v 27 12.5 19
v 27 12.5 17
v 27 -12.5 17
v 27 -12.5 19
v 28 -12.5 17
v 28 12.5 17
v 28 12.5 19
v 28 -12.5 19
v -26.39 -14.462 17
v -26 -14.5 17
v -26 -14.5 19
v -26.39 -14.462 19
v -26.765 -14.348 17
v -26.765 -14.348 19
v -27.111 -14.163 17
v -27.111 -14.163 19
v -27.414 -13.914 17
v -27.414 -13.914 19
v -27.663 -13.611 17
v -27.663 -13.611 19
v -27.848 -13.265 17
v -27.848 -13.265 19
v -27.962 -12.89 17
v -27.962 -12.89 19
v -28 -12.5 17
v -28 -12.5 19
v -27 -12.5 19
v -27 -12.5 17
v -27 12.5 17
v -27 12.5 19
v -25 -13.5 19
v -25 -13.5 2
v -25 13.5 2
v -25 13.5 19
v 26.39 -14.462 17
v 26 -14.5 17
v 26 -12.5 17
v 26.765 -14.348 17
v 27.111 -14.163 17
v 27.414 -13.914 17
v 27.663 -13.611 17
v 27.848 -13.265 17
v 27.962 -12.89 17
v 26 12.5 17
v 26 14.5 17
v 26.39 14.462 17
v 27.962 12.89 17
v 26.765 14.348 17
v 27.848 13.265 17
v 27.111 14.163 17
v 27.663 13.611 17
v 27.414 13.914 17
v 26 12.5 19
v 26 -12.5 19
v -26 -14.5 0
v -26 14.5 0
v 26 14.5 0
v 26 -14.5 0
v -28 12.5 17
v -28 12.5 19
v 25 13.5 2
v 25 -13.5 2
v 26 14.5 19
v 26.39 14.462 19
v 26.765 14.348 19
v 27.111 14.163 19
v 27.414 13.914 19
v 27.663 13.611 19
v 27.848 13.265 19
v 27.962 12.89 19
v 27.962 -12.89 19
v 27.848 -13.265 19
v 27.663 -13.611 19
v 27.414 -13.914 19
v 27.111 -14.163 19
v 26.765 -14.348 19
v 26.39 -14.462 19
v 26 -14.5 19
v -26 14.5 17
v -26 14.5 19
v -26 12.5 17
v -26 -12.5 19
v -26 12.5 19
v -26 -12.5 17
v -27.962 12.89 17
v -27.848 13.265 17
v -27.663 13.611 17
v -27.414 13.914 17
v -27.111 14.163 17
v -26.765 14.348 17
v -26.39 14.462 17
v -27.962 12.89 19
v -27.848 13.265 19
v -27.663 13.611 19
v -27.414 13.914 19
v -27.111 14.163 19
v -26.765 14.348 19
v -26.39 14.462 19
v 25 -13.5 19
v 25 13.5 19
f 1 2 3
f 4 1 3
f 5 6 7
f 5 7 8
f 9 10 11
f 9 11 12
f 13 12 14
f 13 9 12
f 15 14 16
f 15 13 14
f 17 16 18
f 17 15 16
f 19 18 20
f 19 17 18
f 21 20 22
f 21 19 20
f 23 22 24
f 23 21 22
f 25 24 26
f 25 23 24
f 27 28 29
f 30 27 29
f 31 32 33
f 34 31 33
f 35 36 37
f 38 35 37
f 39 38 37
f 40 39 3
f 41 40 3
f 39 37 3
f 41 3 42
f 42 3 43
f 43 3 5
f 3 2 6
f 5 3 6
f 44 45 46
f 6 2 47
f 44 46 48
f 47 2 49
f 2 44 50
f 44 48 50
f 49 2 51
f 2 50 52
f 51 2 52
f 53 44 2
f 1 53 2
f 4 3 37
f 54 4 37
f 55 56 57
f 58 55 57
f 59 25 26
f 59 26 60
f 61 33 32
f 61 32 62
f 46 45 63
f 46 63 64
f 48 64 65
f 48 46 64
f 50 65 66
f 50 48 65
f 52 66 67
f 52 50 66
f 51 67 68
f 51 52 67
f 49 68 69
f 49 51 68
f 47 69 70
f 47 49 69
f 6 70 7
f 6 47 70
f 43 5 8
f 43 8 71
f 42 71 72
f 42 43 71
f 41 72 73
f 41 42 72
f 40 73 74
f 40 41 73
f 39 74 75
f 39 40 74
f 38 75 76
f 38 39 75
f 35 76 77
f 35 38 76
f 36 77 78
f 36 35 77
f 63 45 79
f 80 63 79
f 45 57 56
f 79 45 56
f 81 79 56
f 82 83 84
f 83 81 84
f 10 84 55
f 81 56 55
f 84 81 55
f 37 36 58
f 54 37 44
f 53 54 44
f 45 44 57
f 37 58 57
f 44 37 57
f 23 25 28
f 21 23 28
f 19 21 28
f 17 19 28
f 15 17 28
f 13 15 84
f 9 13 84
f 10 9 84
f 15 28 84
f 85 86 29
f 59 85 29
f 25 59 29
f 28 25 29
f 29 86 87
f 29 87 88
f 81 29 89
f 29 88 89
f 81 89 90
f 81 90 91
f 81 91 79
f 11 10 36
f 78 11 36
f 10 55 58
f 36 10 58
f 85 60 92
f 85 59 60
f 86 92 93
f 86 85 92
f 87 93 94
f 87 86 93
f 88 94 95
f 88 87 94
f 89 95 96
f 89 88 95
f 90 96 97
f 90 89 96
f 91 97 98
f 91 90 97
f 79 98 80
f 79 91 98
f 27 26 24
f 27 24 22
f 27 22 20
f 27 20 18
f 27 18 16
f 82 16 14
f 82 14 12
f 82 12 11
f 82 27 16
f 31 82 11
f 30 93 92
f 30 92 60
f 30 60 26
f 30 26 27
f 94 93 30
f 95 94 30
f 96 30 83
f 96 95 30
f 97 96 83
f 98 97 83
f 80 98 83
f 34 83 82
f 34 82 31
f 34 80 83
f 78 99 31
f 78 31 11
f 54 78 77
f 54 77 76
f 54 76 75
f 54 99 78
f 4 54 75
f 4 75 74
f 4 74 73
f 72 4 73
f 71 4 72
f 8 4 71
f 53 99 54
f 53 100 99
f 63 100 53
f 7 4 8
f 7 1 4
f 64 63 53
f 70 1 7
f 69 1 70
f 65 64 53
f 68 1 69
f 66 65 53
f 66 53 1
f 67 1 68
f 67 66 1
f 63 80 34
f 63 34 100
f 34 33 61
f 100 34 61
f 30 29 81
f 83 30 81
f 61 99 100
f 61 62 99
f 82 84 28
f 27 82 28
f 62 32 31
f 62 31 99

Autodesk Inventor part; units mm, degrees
ref_plane "YZ Plane" through (0, 0, 0) normal (1, 0, 0) x (0, 1, 0)
ref_plane "XZ Plane" through (0, 0, 0) normal (0, 1, 0) x (-1, 0, 0)
ref_plane "XY Plane" through (0, 0, 0) normal (0, 0, 1) x (1, 0, 0)
sketch "Эскиз1" plane through (0, 0, 0) normal (0, 0, 1) x (1, 0, 0)
  line L0 (-26, 14.5) -> (26, 14.5)
  line L1 (26, 14.5) -> (26, -14.5)
  line L2 (26, -14.5) -> (-26, -14.5)
  line L3 (-26, -14.5) -> (-26, 14.5)
  line L4 (0, -20.3) -> (0, 20.3) projected
  line L5 (-36.4, 0) -> (36.4, 0) projected
  point P0 (0, 0)
  dimension "d0" = 29
  dimension "d1" = 52
extrude "Выдавливание1" add sketch "Эскиз1" along normal blind 2
sketch "Эскиз2" plane through (0, 0, 2) normal (0, 0, 1) x (1, 0, 0)
  line L0 (-26, 14.5) -> (-26, -14.5) projected
  line L1 (26, 14.5) -> (-26, 14.5) projected
  line L2 (26, -14.5) -> (26, 14.5) projected
  line L3 (-26, -14.5) -> (26, -14.5) projected
  line L4 (-26, 14.5) -> (26, 14.5)
  line L5 (26, 14.5) -> (26, -14.5)
  line L6 (26, -14.5) -> (-26, -14.5)
  line L7 (-26, -14.5) -> (-26, 14.5)
  line L8 (-25, 13.5) -> (25, 13.5)
  line L9 (25, 13.5) -> (25, -13.5)
  line L10 (25, -13.5) -> (-25, -13.5)
  line L11 (-25, -13.5) -> (-25, 13.5)
  point P0 (0, 0)
  dimension "d4" = 1
  dimension "d5" = 1
  dimension "d6" = 1
  dimension "d7" = 1
extrude "Выдавливание2" add sketch "Эскиз2" along normal blind 15
sketch "Эскиз3" plane through (0, 0, 17) normal (0, 0, 1) x (1, 0, 0)
  line L0 (-26, 14.5) -> (-26, -14.5) projected
  line L1 (-26, 14.5) -> (-26, 14.5)
  line L2 (-26, 14.5) -> (-26, -14.5)
  line L3 (-26, -14.5) -> (-26, -14.5)
  line L4 (-28, -12.5) -> (-28, 12.5)
  line L5 (26, 14.5) -> (-26, 14.5) projected
  line L6 (26, 14.5) -> (26, 14.5)
  line L7 (28, 12.5) -> (28, -12.5)
  line L8 (26, -14.5) -> (26, -14.5)
  line L9 (26, -14.5) -> (26, 14.5)
  arc A0 (-26, 14.5) -> (-28, 12.5) centre (-26, 12.5) ccw
  arc A1 (-28, -12.5) -> (-26, -14.5) centre (-26, -12.5) ccw
  arc A2 (26, -14.5) -> (28, -12.5) centre (26, -12.5) ccw
  arc A3 (28, 12.5) -> (26, 14.5) centre (26, 12.5) ccw
  line L10 (-26, 14.5) -> (26, 14.5)
  line L11 (26, -14.5) -> (26, 14.5) projected
  line L12 (-26, -14.5) -> (26, -14.5)
  line L13 (-26, -12.5) -> (-27, -12.5)
  line L14 (-27, -12.5) -> (-27, 12.5)
  line L15 (-27, 12.5) -> (-26, 12.5)
  line L16 (-26, 12.5) -> (-26, -12.5)
  line L17 (26, 12.5) -> (27, 12.5)
  line L18 (27, 12.5) -> (27, -12.5)
  line L19 (27, -12.5) -> (26, -12.5)
  line L20 (26, -12.5) -> (26, 12.5)
  line L21 (-25, 13.5) -> (25, 13.5) projected
  line L22 (-25, -13.5) -> (-25, 13.5) projected
  line L23 (-25, 13.5) -> (-25, -13.5) projected
  line L24 (-25, -13.5) -> (25, -13.5) projected
  line L25 (25, -13.5) -> (25, 13.5) projected
  line L26 (25, 13.5) -> (-25, 13.5) projected
  point P0 (0, 0)
  point P1 (25, 13.5)
  dimension "d10" = 2
  dimension "d11" = 2
  dimension "d12" = 2
  dimension "d13" = 2
  dimension "d14" = 1
  dimension "d15" = 1
extrude "Выдавливание3" add sketch "Эскиз3" along normal blind 2 contours L5 L9 L12 L0 | L0 L15 L14 L13 A1 L4 A0 | A3 L7 A2 L9 L19 L18 L17
properties part number "бокс стандартный"
